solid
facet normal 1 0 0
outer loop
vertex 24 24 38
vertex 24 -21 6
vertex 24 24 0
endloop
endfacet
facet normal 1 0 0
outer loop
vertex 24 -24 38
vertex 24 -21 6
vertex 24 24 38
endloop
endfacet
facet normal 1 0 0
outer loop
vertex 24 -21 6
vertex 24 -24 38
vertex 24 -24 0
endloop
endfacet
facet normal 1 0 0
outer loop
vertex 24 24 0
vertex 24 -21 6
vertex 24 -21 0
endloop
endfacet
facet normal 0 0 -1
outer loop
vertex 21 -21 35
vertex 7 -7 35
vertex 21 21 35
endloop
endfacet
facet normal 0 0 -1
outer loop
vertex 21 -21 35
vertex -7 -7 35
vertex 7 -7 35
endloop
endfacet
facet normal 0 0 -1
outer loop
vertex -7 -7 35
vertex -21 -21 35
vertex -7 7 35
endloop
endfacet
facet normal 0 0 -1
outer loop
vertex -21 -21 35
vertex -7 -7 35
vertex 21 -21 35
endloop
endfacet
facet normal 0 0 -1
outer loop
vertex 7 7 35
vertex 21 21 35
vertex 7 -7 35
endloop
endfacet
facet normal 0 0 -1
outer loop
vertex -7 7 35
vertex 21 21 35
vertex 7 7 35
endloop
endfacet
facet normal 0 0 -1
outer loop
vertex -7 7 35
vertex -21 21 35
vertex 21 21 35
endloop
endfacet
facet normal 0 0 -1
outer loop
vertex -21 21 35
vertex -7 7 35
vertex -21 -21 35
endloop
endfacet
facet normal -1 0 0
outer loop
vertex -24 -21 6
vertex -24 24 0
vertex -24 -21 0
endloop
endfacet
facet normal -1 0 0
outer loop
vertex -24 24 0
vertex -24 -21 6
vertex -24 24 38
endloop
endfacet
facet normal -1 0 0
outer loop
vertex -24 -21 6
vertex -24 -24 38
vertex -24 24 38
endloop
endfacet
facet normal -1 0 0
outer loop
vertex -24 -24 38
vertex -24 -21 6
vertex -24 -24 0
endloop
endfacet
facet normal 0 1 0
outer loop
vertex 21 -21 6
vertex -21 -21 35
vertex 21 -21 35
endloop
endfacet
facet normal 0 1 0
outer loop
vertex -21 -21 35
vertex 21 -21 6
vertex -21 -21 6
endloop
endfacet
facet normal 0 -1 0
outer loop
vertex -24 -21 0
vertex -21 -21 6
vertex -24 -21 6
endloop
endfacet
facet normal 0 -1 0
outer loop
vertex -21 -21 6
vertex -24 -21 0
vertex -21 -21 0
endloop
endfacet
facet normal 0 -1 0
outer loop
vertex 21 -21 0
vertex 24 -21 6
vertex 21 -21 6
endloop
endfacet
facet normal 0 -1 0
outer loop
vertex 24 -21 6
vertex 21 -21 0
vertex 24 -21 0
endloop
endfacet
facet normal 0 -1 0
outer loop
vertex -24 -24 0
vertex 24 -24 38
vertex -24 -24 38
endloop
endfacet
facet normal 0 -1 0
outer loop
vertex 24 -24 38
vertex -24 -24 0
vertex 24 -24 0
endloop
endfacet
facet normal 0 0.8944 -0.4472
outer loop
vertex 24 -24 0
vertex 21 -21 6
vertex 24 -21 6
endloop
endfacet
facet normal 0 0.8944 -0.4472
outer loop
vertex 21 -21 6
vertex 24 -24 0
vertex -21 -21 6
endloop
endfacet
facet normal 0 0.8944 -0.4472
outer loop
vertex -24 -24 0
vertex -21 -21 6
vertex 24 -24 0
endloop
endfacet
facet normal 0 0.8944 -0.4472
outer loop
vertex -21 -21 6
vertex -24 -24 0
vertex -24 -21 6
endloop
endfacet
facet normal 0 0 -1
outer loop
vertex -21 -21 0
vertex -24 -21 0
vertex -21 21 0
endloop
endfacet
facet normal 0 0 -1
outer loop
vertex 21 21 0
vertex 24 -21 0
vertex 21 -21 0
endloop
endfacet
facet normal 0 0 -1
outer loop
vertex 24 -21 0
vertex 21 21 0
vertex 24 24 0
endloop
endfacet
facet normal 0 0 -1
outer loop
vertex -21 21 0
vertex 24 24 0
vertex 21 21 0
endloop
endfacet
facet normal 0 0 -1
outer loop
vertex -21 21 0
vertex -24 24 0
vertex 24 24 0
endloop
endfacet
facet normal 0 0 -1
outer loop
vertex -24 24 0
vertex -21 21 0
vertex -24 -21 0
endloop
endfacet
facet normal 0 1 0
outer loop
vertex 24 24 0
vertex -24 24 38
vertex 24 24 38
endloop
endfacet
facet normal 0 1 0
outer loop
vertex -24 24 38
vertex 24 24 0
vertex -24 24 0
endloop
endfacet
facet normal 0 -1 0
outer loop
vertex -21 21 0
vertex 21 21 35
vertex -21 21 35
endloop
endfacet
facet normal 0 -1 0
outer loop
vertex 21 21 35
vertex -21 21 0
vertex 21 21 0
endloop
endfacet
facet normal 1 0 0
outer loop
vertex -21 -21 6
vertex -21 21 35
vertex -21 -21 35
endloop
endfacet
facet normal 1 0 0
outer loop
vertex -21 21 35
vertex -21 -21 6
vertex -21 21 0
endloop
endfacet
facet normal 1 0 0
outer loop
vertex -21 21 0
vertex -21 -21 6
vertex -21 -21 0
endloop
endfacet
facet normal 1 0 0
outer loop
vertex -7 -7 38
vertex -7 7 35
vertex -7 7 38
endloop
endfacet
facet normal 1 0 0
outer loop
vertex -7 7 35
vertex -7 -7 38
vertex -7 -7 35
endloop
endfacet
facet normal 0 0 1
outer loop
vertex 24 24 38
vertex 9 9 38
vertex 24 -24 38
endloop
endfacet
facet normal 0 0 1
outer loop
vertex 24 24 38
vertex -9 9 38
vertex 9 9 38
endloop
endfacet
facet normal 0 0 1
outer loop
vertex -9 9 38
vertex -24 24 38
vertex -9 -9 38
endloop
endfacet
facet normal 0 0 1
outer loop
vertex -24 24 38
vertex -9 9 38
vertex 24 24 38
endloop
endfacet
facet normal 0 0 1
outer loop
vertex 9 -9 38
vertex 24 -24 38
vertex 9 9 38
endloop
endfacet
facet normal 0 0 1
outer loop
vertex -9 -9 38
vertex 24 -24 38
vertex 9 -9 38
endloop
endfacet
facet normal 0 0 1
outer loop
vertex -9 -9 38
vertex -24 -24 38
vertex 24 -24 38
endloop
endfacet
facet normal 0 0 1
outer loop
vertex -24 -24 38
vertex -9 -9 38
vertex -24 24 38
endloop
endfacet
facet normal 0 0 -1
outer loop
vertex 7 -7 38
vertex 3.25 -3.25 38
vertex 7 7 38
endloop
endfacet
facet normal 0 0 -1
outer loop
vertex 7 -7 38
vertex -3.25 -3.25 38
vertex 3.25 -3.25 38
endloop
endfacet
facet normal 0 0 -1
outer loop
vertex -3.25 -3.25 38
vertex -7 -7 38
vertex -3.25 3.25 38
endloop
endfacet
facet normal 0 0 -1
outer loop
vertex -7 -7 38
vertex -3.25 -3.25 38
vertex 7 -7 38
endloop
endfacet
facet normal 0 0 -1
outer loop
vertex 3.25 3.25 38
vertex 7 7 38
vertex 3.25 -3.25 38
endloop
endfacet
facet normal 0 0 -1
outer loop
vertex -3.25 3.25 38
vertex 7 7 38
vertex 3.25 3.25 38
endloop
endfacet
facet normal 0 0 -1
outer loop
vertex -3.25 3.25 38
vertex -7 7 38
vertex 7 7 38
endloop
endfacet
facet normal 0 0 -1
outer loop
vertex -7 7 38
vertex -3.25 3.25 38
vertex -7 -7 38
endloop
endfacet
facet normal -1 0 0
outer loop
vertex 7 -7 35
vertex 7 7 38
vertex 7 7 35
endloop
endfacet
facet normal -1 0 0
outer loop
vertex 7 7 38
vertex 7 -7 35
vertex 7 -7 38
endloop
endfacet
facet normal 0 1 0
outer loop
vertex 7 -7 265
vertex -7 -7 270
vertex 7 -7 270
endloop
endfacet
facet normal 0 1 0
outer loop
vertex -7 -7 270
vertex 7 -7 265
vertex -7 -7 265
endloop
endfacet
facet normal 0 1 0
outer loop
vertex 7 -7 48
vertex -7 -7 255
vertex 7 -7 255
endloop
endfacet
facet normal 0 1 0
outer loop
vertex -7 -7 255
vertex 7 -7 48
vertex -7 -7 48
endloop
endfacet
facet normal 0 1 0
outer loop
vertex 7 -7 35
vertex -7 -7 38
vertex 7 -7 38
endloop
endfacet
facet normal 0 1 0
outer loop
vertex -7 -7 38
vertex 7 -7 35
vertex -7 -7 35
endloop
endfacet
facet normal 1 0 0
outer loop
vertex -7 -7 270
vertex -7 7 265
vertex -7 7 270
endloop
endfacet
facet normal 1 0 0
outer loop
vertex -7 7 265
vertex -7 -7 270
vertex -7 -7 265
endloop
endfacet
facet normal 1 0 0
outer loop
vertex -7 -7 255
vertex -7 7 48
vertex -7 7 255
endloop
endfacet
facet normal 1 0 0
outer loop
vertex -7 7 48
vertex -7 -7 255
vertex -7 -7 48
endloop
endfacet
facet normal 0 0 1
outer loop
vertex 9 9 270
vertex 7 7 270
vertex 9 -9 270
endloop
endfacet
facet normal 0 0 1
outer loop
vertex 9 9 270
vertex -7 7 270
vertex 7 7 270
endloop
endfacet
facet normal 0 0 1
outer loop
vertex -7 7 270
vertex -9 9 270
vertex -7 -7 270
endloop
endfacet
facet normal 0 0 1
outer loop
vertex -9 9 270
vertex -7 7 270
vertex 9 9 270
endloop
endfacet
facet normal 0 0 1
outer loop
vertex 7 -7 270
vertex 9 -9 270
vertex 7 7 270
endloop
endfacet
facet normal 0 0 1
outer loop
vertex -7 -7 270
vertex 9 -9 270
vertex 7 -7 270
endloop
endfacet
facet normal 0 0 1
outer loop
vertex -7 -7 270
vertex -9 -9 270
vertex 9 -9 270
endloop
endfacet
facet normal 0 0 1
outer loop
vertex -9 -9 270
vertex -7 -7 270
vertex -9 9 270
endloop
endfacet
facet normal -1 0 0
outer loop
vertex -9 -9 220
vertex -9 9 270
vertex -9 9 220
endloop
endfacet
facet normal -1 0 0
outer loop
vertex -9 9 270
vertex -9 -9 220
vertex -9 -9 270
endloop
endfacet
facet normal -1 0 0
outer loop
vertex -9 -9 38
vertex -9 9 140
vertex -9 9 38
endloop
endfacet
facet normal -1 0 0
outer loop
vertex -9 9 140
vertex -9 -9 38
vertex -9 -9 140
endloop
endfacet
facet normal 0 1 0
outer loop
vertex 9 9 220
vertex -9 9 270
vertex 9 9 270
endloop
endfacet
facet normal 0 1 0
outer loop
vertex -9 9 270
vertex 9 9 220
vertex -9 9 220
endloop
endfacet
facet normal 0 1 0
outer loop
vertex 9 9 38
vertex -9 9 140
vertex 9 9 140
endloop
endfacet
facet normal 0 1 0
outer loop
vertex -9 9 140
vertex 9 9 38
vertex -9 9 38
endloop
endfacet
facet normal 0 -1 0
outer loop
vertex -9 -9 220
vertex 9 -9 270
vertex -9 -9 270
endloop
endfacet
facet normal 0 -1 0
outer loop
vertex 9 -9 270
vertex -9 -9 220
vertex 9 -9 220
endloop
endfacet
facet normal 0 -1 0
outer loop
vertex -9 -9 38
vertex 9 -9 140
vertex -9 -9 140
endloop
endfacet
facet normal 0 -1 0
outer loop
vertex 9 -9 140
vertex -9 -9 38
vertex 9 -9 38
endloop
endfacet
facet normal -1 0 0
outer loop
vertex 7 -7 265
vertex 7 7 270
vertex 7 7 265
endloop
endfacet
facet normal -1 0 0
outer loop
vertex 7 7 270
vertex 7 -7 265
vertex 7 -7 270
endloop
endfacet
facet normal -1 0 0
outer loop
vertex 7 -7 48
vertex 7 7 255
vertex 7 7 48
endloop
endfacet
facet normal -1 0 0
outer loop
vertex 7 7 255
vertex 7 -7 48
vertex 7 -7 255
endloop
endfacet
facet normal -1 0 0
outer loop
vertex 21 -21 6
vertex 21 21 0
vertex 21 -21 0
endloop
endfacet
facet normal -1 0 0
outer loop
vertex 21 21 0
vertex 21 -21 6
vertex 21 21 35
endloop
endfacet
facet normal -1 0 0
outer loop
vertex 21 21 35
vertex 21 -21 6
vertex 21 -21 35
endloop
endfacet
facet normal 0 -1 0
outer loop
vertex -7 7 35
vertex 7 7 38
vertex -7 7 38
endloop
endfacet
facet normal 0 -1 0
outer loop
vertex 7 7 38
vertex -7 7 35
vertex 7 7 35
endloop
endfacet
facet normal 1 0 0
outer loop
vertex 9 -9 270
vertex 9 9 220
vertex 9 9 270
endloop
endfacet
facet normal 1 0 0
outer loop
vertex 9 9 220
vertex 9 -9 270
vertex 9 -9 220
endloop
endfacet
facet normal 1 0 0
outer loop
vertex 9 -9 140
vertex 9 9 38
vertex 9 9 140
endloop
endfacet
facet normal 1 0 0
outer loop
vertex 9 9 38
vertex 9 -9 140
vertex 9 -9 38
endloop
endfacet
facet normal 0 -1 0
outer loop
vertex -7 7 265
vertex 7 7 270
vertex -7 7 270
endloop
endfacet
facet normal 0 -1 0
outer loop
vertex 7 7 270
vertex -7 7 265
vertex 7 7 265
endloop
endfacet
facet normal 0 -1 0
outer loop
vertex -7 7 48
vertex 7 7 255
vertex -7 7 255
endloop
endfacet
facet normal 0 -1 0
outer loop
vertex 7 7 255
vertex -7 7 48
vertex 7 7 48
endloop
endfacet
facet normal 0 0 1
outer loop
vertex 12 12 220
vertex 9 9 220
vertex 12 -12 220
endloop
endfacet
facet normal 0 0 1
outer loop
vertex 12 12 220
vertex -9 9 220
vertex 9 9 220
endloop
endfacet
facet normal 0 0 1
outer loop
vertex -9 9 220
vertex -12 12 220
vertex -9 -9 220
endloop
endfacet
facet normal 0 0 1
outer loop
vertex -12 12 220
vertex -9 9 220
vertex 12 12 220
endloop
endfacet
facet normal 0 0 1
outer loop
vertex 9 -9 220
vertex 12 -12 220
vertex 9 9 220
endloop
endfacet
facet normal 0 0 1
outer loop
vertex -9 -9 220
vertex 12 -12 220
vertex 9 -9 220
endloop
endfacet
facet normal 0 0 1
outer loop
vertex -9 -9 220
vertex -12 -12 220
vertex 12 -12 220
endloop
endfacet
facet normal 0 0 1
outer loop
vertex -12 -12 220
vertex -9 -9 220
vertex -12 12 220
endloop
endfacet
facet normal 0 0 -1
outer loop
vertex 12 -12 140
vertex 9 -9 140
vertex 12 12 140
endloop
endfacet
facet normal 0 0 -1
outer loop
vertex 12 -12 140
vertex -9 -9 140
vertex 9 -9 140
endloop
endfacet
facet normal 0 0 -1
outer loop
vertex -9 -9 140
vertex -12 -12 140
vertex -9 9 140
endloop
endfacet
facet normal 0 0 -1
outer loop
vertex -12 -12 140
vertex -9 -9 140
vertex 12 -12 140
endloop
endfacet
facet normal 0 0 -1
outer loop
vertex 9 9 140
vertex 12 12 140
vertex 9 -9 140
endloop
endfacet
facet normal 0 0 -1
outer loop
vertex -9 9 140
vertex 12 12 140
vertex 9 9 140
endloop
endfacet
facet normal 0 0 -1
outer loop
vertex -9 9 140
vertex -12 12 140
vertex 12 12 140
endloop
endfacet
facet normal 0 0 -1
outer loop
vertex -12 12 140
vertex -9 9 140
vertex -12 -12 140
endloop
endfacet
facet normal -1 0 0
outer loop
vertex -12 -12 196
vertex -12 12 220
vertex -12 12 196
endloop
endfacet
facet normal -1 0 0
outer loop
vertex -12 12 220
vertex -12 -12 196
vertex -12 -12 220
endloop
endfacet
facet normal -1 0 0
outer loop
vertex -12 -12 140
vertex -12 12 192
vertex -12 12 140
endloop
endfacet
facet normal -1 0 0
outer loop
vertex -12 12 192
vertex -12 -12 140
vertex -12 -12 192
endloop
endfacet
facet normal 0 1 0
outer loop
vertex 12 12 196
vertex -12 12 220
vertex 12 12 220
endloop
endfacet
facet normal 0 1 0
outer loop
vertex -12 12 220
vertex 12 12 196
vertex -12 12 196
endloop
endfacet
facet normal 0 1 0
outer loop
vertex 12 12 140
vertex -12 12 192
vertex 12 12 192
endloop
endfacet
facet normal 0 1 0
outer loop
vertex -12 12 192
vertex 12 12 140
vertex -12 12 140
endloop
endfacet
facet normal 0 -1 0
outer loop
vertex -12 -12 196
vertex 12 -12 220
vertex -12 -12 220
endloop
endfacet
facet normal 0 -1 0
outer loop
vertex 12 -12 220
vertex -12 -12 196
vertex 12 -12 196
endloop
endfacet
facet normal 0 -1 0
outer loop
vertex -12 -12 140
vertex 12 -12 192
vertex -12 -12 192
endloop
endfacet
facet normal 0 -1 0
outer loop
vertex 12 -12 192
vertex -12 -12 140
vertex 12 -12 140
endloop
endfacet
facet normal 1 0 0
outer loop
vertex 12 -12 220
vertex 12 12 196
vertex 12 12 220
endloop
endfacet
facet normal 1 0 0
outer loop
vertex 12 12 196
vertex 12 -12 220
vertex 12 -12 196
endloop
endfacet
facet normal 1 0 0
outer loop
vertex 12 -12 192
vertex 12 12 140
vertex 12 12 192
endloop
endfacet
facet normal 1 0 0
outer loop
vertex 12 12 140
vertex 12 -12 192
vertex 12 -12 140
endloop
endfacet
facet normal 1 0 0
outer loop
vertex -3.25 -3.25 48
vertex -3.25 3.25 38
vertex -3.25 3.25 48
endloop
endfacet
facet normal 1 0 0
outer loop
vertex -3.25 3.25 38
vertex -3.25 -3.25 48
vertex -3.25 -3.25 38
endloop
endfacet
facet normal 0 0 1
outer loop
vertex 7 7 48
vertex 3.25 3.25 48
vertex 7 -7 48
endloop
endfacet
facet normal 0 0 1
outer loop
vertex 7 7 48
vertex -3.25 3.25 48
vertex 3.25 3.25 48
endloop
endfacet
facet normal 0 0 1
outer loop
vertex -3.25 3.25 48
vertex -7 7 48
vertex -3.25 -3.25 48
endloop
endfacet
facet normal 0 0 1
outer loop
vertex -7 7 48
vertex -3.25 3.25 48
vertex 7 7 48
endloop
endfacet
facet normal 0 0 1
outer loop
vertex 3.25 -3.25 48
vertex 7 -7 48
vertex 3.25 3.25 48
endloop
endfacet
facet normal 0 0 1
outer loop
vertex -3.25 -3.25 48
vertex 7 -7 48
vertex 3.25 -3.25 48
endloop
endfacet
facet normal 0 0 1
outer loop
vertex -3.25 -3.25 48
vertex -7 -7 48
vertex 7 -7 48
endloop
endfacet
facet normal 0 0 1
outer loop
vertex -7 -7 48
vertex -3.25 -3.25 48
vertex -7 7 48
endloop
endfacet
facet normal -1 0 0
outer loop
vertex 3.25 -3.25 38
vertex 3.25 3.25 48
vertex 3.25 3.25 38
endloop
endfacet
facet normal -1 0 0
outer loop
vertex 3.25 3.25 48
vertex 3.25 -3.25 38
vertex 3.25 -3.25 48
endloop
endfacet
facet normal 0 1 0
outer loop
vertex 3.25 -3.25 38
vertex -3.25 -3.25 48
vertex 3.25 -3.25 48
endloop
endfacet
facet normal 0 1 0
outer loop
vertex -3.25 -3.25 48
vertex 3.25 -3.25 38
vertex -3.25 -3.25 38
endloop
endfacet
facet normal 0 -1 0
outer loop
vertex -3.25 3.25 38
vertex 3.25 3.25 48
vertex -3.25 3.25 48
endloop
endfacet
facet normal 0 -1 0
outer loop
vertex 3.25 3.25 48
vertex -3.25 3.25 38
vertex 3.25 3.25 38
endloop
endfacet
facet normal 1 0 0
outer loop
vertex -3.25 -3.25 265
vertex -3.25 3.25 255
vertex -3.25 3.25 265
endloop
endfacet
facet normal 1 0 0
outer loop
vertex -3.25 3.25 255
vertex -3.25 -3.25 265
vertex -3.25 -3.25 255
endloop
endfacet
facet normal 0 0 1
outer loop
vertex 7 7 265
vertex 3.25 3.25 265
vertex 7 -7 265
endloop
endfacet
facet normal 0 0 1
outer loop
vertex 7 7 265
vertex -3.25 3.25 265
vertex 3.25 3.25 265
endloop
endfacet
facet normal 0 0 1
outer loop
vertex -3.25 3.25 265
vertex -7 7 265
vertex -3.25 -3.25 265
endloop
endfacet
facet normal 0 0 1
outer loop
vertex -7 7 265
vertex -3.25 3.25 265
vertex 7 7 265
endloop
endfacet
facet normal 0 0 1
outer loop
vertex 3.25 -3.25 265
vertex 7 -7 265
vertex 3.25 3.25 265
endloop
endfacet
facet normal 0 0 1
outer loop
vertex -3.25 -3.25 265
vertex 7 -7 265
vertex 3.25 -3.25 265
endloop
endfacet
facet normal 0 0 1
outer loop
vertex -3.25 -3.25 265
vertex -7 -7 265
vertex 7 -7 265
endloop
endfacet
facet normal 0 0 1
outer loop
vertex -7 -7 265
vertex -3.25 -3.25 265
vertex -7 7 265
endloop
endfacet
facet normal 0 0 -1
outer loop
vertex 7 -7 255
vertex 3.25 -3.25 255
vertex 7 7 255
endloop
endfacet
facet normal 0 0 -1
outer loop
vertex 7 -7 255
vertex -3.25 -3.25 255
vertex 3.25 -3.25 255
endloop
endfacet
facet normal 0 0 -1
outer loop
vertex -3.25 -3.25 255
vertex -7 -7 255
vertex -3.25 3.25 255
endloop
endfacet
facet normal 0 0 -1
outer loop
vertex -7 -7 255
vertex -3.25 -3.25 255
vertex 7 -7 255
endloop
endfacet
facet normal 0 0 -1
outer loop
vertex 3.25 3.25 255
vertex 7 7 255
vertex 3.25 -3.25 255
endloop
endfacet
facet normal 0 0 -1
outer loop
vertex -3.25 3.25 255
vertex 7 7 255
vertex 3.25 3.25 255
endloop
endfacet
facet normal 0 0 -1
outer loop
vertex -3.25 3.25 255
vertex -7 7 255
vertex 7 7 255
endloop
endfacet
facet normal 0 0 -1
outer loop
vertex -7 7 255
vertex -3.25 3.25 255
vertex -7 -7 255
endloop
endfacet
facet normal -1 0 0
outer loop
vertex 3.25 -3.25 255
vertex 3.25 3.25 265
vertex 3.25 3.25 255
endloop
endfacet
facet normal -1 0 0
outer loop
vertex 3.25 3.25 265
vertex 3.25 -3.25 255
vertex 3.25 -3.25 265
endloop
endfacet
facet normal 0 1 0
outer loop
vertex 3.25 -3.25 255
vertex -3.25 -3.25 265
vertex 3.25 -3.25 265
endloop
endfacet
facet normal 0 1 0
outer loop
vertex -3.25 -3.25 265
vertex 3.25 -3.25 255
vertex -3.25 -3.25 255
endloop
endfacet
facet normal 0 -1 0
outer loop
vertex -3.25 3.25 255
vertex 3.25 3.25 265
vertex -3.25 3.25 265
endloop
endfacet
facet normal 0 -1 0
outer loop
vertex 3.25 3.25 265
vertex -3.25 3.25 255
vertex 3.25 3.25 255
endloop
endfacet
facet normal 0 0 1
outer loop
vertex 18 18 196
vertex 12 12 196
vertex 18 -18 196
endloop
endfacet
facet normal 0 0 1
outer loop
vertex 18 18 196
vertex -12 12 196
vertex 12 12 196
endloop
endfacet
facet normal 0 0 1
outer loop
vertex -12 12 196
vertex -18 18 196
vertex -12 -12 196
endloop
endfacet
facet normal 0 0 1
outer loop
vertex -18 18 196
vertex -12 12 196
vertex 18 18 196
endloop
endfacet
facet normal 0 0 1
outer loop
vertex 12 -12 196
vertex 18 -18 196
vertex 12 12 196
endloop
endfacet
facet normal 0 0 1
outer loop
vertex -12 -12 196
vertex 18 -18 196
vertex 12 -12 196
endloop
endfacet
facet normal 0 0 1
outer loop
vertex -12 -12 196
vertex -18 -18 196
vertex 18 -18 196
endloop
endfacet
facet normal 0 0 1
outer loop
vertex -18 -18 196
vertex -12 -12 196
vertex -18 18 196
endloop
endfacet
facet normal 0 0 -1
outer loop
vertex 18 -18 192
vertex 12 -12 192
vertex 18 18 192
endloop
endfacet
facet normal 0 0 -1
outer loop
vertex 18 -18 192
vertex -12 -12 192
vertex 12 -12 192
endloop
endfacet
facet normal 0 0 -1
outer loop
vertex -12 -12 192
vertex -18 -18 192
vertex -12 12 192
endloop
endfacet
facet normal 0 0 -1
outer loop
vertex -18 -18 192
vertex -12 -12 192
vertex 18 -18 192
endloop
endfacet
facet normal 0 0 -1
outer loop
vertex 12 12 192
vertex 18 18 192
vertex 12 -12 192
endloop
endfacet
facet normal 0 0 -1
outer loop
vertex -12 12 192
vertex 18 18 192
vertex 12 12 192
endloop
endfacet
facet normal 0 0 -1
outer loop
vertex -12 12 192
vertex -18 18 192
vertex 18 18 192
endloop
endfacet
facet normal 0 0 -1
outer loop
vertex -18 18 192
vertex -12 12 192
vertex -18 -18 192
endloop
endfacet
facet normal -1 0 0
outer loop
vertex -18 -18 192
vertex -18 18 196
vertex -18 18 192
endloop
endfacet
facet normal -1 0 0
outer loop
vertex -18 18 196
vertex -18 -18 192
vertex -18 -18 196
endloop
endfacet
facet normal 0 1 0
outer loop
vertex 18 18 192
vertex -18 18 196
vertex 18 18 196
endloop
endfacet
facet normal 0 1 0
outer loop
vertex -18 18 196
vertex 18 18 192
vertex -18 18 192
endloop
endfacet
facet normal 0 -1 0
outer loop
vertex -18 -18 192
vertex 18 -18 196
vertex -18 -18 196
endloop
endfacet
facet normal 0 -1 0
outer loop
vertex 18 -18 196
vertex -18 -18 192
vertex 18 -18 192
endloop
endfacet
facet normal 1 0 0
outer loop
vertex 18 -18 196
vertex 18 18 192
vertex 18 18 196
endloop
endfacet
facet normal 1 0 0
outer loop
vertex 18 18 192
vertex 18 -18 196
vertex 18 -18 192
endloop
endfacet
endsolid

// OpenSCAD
// Original task reconstruction,MIT license. Units:mm.
// Select part; F6 render; exportSTL. Standard hardware specified inREADME.
part = "Outer";
$fn=64;
module Outer() { union() {
  translate([0.0, -22.5, 20.5]) cube([48.0, 3.0, 29.0],center=true);
  polyhedron(points=[[-24.0, -24.0, 0.0], [-24.0, -24.0, 6.0], [-24.0, -21.0, 6.0], [24.0, -24.0, 0.0], [24.0, -24.0, 6.0], [24.0, -21.0, 6.0]],faces=[[2, 1, 0], [4, 5, 3], [4, 3, 0], [1, 4, 0], [5, 4, 1], [2, 5, 1], [5, 2, 0], [3, 5, 0]],convexity=10);
  translate([0.0, 22.5, 17.5]) cube([48.0, 3.0, 35.0],center=true);
  translate([-22.5, 0.0, 17.5]) cube([3.0, 42.0, 35.0],center=true);
  translate([-15.5, 0.0, 36.5]) cube([17.0, 48.0, 3.0],center=true);
  translate([0.0, -15.5, 36.5]) cube([14.0, 17.0, 3.0],center=true);
  translate([-8.0, 0.0, 154.0]) cube([2.0, 18.0, 232.0],center=true);
  translate([0.0, -8.0, 154.0]) cube([14.0, 2.0, 232.0],center=true);
  translate([22.5, 0.0, 17.5]) cube([3.0, 42.0, 35.0],center=true);
  translate([15.5, 0.0, 36.5]) cube([17.0, 48.0, 3.0],center=true);
  translate([0.0, 15.5, 36.5]) cube([14.0, 17.0, 3.0],center=true);
  translate([8.0, 0.0, 154.0]) cube([2.0, 18.0, 232.0],center=true);
  translate([0.0, 8.0, 154.0]) cube([14.0, 2.0, 232.0],center=true);
  translate([-10.0, 0.0, 180.0]) cube([4.0, 24.0, 80.0],center=true);
  translate([0.0, -10.0, 180.0]) cube([16.0, 4.0, 80.0],center=true);
  translate([10.0, 0.0, 180.0]) cube([4.0, 24.0, 80.0],center=true);
  translate([0.0, 10.0, 180.0]) cube([16.0, 4.0, 80.0],center=true);
  translate([-5.125, 0.0, 43.0]) cube([3.75, 14.0, 10.0],center=true);
  translate([0.0, -5.125, 43.0]) cube([6.5, 3.75, 10.0],center=true);
  translate([5.125, 0.0, 43.0]) cube([3.75, 14.0, 10.0],center=true);
  translate([0.0, 5.125, 43.0]) cube([6.5, 3.75, 10.0],center=true);
  translate([-5.125, 0.0, 260.0]) cube([3.75, 14.0, 10.0],center=true);
  translate([0.0, -5.125, 260.0]) cube([6.5, 3.75, 10.0],center=true);
  translate([5.125, 0.0, 260.0]) cube([3.75, 14.0, 10.0],center=true);
  translate([0.0, 5.125, 260.0]) cube([6.5, 3.75, 10.0],center=true);
  translate([-12.5, 0.0, 194.0]) cube([11.0, 36.0, 4.0],center=true);
  translate([0.0, -12.5, 194.0]) cube([14.0, 11.0, 4.0],center=true);
  translate([12.5, 0.0, 194.0]) cube([11.0, 36.0, 4.0],center=true);
  translate([0.0, 12.5, 194.0]) cube([14.0, 11.0, 4.0],center=true);
} }
if(part=="Outer") Outer();
module Rod() { union() {
  translate([0.0, 0.0, 2.0]) cube([40.0, 40.0, 4.0],center=true);
  translate([0.0, 18.5, 10.0]) cube([34.0, 3.0, 20.0],center=true);
  translate([-18.5, 0.0, 10.0]) cube([3.0, 40.0, 20.0],center=true);
  translate([18.5, 0.0, 10.0]) cube([3.0, 40.0, 20.0],center=true);
  translate([0.0, 0.0, 21.5]) cube([40.0, 40.0, 3.0],center=true);
  translate([0.0, 0.0, 166.5]) cube([6.0, 6.0, 287.0],center=true);
  translate([0.0, 0.0, 310.0]) cylinder(r=15,h=10,center=true);
} }
if(part=="Rod") Rod();
module Source() { union() {
  translate([0.0, 0.0, 2.0]) cube([111.0, 111.0, 3.0],center=true);
  translate([-54.0, 0.0, 76.0]) cube([3.0, 111.0, 145.0],center=true);
  translate([0.0, -54.0, 76.0]) cube([105.0, 3.0, 145.0],center=true);
  translate([54.0, 0.0, 76.0]) cube([3.0, 111.0, 145.0],center=true);
  translate([0.0, 54.0, 76.0]) cube([105.0, 3.0, 145.0],center=true);
} }
if(part=="Source") Source();
module Jar() { union() {
  translate([0.0, 0.0, 2.0]) cube([116.0, 116.0, 3.0],center=true);
  translate([-56.5, 0.0, 51.0]) cube([3.0, 116.0, 95.0],center=true);
  translate([0.0, -56.5, 51.0]) cube([110.0, 3.0, 95.0],center=true);
  translate([56.5, 0.0, 51.0]) cube([3.0, 116.0, 95.0],center=true);
  translate([0.0, 56.5, 51.0]) cube([110.0, 3.0, 95.0],center=true);
} }
if(part=="Jar") Jar();
module Stand() { union() {
  translate([0.0, 0.0, -3.0]) cube([116.0, 116.0, 6.0],center=true);
  translate([-52.0, 0.0, 15.0]) cube([4.0, 108.0, 30.0],center=true);
  translate([52.0, 0.0, 15.0]) cube([4.0, 108.0, 30.0],center=true);
  translate([0.0, -52.0, 15.0]) cube([108.0, 4.0, 30.0],center=true);
  translate([0.0, 52.0, 15.0]) cube([108.0, 4.0, 30.0],center=true);
} }
if(part=="Stand") Stand();
module Containment() { union() {
  translate([0.0, 0.0, 1.0]) cube([526.0, 626.0, 3.0],center=true);
  translate([-261.5, 0.0, 27.5]) cube([3.0, 626.0, 50.0],center=true);
  translate([0.0, -311.5, 27.5]) cube([520.0, 3.0, 50.0],center=true);
  translate([261.5, 0.0, 27.5]) cube([3.0, 626.0, 50.0],center=true);
  translate([0.0, 311.5, 27.5]) cube([520.0, 3.0, 50.0],center=true);
  translate([0.0, 0.0, -0.5]) cube([526.0, 626.0, 8.0],center=true);
} }
if(part=="Containment") Containment();
if(part=="granule") sphere(r=3.4);
